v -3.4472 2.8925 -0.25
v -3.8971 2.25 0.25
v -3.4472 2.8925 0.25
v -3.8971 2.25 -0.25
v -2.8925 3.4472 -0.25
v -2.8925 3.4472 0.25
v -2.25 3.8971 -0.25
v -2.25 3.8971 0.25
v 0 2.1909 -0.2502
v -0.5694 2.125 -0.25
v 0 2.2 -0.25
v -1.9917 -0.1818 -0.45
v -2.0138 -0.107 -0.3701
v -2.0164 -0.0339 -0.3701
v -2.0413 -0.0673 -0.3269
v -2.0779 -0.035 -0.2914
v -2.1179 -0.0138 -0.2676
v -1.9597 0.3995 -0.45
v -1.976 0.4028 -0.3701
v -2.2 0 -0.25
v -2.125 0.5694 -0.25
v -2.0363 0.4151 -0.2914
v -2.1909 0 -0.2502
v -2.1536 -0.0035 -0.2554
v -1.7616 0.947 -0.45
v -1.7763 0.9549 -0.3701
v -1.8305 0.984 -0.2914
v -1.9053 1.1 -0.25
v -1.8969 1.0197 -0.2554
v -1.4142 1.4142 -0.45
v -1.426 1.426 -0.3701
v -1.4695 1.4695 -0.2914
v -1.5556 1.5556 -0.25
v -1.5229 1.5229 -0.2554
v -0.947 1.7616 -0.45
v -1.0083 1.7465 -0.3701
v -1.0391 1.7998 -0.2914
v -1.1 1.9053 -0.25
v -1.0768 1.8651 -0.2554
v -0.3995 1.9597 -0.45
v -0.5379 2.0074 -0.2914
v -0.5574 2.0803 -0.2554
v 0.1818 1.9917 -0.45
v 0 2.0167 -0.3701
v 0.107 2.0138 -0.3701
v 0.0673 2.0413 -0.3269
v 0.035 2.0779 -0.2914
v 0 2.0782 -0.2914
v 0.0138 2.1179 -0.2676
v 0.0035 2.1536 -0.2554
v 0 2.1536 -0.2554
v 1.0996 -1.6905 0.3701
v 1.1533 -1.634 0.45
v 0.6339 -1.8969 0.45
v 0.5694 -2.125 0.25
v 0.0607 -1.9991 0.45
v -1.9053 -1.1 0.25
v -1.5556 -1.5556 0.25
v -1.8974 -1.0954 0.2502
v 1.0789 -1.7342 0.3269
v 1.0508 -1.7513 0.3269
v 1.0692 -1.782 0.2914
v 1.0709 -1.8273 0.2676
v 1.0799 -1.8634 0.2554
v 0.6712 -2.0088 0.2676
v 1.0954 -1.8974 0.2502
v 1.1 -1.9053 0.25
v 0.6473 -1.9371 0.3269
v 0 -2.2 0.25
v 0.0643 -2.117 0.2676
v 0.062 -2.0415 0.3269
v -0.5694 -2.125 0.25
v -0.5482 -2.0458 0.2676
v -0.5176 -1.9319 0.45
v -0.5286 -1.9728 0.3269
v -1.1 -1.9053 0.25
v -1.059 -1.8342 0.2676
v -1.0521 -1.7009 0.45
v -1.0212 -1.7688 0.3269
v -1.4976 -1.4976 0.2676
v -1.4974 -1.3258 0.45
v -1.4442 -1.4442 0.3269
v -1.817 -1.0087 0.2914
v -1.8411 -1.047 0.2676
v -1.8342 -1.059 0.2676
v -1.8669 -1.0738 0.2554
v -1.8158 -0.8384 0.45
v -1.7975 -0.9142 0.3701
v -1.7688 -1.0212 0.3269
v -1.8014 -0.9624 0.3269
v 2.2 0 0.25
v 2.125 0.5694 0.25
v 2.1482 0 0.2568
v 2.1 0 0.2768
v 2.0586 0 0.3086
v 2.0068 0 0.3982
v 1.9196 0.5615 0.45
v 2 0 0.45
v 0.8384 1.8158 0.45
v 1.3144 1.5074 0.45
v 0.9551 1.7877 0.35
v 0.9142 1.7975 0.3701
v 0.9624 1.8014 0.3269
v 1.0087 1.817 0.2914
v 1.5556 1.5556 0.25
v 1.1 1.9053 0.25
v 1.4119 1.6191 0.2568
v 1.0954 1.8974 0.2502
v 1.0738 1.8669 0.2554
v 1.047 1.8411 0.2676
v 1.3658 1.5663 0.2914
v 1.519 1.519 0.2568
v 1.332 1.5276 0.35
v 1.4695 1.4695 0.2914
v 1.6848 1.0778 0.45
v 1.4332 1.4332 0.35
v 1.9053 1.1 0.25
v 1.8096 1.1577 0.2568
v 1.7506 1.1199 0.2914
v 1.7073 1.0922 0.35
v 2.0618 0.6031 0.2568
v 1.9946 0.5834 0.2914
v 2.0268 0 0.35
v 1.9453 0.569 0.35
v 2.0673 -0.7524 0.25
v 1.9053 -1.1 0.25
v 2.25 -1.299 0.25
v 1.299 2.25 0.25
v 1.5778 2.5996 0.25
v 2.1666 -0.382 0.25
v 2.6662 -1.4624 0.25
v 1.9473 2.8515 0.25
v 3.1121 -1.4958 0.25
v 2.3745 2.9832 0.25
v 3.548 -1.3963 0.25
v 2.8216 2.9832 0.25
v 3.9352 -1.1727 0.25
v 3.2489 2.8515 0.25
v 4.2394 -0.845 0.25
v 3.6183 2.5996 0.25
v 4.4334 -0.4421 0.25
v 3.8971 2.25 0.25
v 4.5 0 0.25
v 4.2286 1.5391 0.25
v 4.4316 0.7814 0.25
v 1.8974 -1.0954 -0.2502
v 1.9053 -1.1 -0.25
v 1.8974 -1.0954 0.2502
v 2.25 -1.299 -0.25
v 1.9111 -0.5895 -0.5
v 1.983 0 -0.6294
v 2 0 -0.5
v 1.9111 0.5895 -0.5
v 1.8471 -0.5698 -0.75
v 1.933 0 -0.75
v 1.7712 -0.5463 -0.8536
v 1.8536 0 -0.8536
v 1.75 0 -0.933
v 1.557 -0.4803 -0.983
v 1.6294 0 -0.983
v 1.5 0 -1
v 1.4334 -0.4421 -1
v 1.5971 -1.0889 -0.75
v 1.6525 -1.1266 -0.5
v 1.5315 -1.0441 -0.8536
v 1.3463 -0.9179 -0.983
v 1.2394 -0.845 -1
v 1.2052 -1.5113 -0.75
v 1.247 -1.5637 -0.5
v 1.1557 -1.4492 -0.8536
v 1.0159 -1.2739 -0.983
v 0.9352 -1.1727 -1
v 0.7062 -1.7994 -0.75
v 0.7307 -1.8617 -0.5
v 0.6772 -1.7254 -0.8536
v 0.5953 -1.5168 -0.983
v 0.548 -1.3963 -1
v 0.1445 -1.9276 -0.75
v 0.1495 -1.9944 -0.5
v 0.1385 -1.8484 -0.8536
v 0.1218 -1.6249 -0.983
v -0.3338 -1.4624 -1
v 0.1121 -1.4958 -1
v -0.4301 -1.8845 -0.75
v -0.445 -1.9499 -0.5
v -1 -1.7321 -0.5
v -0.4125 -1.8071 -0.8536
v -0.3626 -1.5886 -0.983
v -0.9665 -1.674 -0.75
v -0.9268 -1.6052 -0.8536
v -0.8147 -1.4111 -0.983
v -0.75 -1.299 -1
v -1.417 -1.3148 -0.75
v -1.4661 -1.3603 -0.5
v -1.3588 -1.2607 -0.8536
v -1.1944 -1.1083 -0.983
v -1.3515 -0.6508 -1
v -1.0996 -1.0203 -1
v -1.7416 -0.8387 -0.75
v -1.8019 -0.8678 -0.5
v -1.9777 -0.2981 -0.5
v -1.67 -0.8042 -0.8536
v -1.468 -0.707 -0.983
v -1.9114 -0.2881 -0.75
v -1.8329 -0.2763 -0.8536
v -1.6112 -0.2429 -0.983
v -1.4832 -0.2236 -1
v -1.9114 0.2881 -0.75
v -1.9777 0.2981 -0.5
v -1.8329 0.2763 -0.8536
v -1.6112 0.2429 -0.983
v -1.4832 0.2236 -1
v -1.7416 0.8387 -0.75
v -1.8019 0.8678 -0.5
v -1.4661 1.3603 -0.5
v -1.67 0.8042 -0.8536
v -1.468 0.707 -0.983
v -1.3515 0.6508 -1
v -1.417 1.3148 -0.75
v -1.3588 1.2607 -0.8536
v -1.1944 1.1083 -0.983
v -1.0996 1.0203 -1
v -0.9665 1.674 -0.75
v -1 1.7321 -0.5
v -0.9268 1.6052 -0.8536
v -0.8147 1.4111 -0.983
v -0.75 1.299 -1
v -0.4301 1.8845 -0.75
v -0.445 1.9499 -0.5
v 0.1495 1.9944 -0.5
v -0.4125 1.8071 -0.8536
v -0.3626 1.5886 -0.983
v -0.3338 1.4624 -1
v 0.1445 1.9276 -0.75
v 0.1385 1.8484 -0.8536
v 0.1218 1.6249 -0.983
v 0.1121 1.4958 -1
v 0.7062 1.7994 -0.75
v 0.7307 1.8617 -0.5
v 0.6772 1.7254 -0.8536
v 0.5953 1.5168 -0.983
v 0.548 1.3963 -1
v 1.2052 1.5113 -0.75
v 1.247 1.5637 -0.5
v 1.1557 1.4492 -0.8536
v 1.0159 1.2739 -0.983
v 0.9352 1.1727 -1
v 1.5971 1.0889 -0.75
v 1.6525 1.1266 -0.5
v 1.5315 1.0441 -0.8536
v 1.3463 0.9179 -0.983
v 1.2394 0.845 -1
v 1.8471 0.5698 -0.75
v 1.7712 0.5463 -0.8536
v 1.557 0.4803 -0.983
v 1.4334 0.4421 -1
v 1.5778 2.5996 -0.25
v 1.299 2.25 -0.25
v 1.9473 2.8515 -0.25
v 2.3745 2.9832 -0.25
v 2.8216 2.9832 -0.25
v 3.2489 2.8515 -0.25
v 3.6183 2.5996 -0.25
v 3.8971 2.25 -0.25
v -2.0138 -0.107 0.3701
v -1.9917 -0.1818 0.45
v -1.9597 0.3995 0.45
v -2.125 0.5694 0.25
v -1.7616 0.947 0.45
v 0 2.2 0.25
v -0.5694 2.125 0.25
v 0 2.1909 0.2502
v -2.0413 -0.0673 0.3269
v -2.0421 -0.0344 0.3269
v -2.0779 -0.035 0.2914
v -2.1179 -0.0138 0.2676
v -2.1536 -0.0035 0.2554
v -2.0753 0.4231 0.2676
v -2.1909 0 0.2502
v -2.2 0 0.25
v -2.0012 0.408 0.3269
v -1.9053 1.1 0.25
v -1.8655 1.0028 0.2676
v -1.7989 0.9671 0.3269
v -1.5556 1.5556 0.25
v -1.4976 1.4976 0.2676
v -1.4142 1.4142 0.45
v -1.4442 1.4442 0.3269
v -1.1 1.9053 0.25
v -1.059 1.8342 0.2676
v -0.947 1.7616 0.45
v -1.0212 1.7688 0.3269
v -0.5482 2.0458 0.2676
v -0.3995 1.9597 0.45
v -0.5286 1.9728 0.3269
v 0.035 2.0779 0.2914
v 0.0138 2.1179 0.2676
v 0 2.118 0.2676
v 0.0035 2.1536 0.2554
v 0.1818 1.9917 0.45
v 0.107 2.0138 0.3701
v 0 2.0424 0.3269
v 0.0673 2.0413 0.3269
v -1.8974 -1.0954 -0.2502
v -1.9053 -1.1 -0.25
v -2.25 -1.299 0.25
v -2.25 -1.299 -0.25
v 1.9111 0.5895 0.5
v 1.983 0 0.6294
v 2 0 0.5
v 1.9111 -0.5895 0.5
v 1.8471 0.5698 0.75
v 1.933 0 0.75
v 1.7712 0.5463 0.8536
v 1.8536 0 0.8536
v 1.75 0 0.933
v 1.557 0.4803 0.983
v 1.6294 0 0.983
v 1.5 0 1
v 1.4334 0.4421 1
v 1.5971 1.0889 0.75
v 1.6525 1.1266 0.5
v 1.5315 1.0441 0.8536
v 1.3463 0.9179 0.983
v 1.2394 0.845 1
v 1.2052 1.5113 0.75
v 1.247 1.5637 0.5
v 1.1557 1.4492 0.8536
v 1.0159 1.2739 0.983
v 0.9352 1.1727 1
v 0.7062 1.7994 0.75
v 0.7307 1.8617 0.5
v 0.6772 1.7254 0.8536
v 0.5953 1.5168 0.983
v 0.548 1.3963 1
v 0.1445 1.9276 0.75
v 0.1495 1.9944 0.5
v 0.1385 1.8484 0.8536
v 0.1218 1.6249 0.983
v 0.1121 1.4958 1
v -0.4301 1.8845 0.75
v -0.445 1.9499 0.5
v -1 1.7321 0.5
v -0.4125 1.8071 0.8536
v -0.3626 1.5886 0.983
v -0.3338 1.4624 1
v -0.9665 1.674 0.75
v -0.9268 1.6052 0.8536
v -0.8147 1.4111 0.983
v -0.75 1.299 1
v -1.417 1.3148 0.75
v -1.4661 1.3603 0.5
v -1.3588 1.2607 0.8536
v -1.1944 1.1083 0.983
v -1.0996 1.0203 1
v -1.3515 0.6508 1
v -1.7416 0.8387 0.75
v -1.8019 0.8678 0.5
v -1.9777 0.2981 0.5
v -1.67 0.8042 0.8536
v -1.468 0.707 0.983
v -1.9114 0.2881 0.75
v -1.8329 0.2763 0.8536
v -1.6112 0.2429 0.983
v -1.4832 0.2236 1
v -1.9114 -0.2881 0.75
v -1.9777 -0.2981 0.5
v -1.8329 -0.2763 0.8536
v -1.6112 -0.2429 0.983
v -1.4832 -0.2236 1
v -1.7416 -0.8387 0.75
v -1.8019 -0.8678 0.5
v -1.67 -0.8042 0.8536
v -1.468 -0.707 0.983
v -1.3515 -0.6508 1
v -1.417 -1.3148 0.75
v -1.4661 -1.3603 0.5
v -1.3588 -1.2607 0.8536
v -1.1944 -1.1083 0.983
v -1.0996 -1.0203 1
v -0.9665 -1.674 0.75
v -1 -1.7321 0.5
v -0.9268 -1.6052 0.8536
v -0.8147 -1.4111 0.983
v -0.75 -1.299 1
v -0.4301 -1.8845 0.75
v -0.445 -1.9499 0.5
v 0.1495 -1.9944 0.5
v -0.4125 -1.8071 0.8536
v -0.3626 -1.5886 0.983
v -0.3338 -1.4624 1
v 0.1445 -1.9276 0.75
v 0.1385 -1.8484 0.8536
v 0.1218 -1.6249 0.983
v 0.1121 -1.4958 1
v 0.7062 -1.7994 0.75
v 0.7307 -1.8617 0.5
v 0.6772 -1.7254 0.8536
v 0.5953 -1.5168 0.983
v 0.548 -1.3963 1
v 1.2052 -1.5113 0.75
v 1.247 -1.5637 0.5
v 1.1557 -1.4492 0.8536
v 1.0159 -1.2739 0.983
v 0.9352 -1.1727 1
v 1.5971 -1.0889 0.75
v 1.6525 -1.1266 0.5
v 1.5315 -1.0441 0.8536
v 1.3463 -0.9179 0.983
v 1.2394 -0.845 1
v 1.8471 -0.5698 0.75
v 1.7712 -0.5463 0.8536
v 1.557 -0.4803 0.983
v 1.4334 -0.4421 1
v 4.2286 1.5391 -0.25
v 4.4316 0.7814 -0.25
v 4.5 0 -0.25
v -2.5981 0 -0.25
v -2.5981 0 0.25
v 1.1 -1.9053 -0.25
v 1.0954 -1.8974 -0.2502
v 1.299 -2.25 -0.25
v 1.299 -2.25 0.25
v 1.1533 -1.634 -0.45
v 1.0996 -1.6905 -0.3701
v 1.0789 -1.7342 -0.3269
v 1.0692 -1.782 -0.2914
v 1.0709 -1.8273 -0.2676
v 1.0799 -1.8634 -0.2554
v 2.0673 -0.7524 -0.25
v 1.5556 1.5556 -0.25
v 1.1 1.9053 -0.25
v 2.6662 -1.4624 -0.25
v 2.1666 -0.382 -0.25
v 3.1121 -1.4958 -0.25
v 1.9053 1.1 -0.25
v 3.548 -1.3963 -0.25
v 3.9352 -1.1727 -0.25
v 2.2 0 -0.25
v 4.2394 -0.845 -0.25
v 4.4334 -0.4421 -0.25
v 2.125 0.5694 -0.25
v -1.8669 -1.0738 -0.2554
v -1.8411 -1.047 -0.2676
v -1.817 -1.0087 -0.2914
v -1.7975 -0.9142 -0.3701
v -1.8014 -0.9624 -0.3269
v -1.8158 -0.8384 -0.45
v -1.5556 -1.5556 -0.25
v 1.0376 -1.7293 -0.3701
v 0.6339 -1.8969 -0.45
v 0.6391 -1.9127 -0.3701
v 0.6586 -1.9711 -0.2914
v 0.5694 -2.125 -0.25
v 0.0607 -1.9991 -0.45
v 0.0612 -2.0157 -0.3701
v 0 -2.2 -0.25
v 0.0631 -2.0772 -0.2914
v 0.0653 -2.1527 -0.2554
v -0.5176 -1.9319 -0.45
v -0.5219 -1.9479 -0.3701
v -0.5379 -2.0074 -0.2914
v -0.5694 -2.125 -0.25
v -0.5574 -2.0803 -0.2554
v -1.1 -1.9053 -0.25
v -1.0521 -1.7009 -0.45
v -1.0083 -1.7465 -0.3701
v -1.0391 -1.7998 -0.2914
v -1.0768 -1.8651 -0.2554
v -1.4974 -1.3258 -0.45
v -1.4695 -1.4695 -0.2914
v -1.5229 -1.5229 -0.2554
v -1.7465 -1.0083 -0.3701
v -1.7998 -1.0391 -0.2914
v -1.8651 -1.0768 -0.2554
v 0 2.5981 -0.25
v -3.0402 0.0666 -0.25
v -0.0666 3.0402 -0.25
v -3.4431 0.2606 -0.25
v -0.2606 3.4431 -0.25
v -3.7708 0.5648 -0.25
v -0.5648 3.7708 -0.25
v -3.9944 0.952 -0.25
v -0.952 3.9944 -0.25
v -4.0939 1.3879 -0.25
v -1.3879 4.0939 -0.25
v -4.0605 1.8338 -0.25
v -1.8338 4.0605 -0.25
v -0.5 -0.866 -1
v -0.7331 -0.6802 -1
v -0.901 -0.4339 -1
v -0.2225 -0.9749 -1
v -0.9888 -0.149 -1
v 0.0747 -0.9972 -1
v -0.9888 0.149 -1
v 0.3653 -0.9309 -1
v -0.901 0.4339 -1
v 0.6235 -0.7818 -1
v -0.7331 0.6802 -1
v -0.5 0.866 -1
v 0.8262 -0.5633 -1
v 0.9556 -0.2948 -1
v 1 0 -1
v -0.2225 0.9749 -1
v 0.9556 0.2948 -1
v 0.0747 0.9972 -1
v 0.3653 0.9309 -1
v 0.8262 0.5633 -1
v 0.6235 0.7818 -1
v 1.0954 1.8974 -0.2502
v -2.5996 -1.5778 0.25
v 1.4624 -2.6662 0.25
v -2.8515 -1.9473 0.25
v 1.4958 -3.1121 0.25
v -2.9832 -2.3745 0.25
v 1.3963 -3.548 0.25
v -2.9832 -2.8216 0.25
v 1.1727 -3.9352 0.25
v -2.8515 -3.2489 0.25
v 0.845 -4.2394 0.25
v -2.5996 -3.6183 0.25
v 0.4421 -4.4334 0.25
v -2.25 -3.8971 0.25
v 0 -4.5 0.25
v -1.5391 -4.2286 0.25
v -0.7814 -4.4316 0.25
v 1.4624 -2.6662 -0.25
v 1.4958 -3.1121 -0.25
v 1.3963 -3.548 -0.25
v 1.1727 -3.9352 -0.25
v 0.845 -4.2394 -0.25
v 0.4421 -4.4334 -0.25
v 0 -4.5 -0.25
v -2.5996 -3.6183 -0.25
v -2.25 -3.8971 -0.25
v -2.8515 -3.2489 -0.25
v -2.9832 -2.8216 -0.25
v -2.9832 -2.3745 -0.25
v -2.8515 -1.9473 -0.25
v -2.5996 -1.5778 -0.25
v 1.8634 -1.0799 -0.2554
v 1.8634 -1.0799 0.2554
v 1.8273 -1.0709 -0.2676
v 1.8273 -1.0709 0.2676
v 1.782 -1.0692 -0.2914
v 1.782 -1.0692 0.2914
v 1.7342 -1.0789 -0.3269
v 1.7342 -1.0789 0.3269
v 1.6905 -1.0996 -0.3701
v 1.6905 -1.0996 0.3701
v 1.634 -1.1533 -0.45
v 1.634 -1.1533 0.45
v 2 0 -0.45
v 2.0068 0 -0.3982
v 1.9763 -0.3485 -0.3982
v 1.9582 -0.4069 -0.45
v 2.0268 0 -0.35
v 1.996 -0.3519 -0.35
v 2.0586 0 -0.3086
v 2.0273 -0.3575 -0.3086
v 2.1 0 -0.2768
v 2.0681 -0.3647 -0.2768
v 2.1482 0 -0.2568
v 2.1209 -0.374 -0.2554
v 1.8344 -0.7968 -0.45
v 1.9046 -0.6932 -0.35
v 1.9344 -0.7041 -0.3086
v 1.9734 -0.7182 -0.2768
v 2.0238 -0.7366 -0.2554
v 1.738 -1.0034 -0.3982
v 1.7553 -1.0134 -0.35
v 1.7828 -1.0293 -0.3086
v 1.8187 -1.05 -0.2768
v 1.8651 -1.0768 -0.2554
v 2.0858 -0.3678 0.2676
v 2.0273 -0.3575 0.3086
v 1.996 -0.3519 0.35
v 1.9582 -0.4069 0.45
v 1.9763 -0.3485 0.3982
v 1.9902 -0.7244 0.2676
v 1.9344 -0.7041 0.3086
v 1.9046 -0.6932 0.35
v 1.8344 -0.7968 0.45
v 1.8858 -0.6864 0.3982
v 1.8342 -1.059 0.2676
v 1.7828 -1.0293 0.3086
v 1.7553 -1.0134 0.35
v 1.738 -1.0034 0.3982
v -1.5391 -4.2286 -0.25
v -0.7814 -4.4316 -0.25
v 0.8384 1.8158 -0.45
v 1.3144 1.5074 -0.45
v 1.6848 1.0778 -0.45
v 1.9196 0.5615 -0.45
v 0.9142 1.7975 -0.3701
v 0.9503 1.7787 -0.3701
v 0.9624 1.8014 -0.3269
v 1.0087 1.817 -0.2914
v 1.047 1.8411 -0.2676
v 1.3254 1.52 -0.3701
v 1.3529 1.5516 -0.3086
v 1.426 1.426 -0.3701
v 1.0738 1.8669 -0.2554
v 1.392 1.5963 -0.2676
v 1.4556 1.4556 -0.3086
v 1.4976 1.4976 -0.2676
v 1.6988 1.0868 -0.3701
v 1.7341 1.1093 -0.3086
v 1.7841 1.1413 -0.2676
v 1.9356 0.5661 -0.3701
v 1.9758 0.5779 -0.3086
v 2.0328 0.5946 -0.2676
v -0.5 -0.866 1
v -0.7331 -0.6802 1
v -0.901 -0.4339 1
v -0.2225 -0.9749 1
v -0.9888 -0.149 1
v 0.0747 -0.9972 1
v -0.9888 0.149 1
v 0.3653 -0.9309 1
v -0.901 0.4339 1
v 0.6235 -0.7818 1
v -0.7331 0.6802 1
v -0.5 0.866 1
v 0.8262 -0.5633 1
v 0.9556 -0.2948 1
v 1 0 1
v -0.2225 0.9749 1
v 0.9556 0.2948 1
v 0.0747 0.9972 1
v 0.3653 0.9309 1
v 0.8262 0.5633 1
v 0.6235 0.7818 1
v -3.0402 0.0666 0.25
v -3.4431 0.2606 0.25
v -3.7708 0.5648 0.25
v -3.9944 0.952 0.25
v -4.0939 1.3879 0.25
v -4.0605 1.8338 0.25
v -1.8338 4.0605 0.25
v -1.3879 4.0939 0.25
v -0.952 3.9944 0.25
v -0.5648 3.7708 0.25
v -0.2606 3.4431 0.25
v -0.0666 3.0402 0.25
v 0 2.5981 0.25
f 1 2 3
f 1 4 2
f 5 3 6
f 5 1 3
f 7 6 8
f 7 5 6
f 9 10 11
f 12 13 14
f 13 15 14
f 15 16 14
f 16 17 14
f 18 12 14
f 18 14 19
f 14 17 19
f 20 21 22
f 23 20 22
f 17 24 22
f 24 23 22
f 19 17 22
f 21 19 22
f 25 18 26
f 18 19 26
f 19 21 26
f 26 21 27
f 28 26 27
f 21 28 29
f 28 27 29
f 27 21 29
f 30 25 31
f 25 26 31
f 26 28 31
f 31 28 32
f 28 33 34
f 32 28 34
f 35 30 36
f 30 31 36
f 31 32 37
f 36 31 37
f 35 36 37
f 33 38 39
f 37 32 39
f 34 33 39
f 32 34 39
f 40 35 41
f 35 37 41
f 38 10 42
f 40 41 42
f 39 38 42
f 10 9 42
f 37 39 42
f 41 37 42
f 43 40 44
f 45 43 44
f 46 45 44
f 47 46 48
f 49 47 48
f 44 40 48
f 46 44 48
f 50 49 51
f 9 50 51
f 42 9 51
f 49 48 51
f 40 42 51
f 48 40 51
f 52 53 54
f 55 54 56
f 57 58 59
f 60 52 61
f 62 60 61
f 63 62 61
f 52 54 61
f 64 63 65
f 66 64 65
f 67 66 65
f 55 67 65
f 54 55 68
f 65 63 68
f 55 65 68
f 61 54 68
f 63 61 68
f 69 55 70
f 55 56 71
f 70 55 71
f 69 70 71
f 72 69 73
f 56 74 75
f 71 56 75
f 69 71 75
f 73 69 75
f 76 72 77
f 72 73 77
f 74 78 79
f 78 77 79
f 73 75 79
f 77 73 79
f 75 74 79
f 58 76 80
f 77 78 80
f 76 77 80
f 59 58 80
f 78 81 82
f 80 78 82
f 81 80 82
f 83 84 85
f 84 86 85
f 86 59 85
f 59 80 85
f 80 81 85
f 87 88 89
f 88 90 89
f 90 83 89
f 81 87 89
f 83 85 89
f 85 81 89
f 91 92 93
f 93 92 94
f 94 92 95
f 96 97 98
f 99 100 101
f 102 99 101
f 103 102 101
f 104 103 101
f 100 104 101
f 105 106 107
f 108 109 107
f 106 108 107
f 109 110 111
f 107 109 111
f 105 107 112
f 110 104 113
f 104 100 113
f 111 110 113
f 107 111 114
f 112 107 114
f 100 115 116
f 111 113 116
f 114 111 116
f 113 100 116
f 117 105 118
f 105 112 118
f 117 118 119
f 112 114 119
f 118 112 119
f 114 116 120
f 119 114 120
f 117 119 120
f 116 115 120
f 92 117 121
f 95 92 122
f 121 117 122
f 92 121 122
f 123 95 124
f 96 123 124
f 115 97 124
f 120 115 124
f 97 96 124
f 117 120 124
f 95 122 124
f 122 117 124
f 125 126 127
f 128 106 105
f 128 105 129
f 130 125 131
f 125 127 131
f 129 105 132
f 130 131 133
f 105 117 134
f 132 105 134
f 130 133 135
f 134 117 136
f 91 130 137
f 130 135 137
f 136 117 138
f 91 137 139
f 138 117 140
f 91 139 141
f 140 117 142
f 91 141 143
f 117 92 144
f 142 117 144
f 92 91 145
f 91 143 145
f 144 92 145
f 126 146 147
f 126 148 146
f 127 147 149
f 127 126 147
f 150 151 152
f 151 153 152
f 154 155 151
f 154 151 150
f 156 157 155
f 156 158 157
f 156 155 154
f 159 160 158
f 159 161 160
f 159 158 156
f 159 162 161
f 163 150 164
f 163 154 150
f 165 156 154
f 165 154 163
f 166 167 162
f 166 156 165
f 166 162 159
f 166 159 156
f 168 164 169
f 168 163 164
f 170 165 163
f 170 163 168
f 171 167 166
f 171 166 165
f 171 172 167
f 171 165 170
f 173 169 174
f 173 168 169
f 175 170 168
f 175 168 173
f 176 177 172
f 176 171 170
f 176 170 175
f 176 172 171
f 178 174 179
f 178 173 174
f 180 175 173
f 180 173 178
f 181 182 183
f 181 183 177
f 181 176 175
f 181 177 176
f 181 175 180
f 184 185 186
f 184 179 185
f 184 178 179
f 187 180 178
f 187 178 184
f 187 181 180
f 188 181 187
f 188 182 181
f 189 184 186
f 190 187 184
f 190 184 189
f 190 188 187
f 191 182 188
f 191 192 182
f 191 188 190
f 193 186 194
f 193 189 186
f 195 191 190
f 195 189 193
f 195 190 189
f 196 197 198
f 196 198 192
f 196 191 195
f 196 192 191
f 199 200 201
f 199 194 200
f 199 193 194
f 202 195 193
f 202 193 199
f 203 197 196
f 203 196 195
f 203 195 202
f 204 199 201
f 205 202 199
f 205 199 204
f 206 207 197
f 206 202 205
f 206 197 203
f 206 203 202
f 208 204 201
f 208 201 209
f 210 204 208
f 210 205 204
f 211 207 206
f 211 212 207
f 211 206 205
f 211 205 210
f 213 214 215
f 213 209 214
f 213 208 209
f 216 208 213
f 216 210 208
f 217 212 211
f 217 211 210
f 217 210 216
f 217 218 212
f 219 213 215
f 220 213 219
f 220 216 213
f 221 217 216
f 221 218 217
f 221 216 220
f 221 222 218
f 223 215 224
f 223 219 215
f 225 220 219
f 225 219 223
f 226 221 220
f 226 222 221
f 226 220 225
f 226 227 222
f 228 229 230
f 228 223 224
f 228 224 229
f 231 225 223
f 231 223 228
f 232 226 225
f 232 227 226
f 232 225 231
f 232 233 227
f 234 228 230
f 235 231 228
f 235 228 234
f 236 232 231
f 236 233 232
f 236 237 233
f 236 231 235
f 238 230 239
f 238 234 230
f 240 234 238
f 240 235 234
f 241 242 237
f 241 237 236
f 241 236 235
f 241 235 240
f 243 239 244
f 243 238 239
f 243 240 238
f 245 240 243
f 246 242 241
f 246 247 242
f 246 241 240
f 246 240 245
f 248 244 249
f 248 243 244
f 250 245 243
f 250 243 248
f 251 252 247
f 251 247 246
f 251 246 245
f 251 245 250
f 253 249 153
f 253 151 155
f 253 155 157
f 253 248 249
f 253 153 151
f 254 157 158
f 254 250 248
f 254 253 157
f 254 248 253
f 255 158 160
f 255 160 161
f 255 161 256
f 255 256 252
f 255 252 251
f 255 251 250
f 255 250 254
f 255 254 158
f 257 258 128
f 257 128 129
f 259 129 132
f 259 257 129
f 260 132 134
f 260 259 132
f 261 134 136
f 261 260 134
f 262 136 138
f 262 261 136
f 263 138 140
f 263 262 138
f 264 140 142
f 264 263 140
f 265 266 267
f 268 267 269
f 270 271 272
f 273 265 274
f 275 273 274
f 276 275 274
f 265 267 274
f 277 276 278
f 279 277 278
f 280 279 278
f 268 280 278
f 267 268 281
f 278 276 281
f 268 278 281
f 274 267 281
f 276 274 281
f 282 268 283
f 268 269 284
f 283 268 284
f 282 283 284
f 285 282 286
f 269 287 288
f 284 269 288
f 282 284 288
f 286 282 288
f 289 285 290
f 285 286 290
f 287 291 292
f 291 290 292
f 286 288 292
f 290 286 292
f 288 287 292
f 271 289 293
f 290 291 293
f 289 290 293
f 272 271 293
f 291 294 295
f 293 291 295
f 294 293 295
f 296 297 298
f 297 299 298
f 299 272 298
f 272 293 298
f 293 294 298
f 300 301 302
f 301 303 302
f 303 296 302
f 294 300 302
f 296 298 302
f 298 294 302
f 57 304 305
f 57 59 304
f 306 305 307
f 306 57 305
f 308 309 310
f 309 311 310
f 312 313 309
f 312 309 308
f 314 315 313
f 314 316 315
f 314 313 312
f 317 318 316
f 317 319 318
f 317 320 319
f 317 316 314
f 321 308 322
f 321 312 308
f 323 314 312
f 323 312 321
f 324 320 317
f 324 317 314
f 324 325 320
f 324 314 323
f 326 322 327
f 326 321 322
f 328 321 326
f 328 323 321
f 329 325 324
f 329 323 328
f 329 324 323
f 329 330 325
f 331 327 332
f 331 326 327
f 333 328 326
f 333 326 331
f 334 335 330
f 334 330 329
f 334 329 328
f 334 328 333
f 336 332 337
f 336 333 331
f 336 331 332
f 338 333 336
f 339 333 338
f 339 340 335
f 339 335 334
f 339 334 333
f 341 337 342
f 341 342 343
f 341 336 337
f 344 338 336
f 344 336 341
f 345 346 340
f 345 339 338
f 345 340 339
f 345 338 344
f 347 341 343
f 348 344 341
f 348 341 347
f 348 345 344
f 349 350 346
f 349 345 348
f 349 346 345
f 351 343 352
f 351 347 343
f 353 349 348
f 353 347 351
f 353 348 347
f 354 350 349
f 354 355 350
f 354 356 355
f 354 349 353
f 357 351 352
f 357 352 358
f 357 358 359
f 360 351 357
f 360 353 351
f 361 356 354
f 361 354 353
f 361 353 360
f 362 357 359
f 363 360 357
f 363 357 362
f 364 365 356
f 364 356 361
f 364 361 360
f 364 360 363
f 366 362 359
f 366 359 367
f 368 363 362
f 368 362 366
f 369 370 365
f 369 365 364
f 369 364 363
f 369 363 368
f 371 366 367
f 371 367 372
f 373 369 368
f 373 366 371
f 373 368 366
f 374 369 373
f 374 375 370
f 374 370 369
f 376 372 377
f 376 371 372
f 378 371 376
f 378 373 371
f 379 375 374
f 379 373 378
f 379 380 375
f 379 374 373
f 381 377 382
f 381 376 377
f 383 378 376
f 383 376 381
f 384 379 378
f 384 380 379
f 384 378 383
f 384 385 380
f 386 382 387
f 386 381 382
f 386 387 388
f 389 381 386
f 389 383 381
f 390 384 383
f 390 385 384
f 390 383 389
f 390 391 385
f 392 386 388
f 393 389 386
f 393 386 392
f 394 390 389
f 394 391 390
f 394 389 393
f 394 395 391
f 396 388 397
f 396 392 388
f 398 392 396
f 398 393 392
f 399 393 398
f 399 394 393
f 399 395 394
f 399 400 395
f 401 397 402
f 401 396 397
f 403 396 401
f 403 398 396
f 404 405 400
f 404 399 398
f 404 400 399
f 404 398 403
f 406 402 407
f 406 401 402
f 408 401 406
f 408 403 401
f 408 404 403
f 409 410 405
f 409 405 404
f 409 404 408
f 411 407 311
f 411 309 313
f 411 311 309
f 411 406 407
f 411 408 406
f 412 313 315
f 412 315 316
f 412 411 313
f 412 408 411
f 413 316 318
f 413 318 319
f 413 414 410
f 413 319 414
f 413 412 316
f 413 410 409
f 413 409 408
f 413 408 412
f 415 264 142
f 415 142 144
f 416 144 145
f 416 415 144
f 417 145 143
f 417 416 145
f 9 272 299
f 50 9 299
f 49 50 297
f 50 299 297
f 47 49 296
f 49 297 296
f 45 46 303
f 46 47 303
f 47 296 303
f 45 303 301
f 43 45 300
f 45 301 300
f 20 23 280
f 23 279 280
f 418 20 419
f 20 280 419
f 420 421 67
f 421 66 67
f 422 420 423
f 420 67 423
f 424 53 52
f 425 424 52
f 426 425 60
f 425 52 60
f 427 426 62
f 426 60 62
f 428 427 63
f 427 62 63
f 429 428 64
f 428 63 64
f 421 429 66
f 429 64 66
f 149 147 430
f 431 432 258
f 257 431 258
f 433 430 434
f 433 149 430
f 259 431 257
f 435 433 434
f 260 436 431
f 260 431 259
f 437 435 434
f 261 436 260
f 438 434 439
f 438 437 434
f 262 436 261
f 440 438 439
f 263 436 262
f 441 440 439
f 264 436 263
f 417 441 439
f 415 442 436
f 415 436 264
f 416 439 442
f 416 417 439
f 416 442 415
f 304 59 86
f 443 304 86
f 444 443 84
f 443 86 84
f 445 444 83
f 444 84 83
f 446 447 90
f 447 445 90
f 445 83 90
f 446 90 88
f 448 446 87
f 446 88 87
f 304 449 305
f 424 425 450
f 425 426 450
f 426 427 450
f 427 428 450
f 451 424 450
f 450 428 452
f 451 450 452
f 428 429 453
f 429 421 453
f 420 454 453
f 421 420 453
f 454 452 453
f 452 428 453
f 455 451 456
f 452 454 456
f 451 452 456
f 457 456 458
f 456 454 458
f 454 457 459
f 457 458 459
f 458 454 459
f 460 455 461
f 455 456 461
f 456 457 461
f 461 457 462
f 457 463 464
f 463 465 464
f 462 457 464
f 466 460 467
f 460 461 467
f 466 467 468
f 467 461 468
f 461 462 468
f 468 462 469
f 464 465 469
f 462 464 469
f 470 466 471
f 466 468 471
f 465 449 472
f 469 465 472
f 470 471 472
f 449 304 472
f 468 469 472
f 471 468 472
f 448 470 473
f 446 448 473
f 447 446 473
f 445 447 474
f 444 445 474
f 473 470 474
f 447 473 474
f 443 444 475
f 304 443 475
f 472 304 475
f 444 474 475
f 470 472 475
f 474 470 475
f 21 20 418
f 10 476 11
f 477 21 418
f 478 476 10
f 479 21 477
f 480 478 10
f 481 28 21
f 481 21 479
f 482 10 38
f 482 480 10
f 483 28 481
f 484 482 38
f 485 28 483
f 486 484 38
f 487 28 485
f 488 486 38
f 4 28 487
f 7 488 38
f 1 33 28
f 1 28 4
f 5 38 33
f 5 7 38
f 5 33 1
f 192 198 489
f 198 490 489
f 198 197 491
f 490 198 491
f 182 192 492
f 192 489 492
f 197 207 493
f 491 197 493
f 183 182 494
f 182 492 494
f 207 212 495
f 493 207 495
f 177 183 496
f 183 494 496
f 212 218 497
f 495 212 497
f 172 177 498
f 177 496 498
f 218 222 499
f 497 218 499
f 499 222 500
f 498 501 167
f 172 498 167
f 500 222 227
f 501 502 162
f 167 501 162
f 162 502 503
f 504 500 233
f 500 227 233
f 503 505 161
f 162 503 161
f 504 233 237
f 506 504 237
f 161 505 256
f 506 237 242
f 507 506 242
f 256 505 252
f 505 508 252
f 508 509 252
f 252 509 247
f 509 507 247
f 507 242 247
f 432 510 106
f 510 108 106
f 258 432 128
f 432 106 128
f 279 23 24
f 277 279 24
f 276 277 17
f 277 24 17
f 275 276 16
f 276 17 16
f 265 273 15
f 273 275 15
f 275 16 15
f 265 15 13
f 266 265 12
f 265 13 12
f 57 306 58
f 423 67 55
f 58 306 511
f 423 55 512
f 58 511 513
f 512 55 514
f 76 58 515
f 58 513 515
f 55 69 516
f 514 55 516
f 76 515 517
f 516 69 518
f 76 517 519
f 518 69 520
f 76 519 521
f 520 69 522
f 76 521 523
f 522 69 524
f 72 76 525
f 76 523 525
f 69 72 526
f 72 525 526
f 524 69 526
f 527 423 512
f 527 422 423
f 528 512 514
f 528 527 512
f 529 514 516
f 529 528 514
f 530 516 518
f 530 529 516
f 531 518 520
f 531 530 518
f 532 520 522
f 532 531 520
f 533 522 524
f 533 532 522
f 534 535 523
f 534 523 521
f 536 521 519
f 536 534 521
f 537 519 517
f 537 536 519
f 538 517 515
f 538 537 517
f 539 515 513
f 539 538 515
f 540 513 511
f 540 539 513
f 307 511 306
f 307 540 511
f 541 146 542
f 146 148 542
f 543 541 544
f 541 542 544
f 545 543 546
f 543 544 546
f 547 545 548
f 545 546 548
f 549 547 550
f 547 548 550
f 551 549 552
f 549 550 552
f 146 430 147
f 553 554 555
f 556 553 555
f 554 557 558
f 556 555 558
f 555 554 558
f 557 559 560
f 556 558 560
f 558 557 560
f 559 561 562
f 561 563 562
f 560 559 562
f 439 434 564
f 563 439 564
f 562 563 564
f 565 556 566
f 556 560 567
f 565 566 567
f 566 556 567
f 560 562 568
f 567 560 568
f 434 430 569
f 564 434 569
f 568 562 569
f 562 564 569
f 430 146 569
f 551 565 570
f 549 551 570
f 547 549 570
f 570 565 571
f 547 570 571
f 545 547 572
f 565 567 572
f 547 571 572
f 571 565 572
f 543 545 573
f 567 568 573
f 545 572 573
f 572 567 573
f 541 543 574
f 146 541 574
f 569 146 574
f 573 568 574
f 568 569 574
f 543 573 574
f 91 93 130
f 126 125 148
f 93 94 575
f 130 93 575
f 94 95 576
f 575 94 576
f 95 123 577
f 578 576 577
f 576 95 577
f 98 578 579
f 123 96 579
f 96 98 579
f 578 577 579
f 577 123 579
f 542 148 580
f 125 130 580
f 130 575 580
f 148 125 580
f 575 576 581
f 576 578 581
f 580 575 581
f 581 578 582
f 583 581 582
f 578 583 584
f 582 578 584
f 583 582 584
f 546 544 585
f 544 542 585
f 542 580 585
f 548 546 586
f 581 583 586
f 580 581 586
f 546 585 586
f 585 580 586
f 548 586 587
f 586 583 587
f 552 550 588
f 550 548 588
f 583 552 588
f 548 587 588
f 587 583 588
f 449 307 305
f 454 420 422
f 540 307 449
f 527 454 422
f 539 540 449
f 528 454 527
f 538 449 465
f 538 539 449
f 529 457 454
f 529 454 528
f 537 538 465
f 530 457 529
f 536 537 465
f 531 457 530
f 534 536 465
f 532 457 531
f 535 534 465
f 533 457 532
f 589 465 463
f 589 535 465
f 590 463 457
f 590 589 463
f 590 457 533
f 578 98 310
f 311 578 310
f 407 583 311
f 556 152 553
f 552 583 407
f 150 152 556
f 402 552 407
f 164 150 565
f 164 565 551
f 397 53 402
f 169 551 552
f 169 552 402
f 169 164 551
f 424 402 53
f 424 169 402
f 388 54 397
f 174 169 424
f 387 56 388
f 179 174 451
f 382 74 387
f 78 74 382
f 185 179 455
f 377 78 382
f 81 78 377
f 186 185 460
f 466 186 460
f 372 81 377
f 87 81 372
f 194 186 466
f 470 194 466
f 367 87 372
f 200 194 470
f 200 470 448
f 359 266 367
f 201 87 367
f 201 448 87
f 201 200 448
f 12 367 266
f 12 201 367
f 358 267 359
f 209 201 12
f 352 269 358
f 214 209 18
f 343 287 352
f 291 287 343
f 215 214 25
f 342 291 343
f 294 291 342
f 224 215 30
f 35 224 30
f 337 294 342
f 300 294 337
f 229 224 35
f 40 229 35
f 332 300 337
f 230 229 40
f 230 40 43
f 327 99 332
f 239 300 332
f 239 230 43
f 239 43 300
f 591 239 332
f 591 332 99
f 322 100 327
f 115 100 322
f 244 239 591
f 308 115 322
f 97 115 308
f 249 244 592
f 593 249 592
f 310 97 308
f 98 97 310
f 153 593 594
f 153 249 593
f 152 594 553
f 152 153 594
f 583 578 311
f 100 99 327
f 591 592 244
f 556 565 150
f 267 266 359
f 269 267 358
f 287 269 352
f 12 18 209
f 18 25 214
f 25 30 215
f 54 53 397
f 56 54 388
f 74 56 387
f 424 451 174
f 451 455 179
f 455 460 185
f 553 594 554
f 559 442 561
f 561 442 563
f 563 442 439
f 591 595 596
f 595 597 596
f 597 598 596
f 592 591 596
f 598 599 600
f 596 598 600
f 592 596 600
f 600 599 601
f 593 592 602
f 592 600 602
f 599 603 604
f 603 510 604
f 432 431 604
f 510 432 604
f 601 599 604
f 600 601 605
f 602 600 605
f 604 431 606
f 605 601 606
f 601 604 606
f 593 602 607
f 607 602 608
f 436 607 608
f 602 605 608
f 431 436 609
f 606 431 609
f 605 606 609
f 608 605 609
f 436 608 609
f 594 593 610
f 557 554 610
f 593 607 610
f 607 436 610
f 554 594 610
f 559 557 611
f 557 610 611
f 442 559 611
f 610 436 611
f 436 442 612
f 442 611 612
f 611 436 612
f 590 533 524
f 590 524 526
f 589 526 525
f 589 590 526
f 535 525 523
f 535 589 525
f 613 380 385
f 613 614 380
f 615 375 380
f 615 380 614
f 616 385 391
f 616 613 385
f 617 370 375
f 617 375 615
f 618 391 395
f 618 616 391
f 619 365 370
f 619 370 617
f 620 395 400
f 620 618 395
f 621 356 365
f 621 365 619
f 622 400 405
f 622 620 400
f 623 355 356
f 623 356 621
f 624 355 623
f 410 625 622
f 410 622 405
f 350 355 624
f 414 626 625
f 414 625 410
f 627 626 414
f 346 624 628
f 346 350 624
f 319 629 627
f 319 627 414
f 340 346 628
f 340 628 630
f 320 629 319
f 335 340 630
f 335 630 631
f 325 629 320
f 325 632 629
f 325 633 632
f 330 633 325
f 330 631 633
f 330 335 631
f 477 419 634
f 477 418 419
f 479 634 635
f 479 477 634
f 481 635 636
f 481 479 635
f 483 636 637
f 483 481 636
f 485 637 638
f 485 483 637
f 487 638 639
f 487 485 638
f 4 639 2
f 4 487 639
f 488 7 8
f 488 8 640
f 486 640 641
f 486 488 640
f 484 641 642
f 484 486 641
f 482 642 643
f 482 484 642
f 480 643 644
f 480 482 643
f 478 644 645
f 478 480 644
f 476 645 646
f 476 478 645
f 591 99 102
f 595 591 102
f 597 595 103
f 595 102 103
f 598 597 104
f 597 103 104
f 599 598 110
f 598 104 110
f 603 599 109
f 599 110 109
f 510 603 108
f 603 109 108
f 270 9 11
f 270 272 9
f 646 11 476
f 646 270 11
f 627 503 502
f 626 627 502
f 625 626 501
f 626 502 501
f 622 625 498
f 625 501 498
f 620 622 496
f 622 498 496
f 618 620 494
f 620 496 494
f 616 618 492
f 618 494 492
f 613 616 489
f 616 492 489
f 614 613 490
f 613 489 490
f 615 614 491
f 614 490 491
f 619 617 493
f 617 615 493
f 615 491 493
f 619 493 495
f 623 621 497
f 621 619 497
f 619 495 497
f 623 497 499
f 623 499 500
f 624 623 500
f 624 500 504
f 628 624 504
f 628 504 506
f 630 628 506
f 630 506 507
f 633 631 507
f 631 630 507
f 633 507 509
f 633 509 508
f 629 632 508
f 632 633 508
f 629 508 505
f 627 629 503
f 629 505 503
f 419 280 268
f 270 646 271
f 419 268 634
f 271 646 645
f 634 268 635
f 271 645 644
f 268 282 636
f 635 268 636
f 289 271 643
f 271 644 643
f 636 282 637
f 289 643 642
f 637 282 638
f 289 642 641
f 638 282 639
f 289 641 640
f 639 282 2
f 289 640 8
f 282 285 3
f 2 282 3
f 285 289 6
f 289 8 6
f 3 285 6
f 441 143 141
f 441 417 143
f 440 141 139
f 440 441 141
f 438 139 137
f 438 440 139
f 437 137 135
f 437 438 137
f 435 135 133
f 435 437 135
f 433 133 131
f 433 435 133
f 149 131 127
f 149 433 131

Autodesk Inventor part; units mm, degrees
ref_plane "YZ Plane" through (0, 0, 0) normal (1, 0, 0) x (0, 1, 0)
ref_plane "XZ Plane" through (0, 0, 0) normal (0, 1, 0) x (-1, 0, 0)
ref_plane "XY Plane" through (0, 0, 0) normal (0, 0, 1) x (1, 0, 0)
sketch "Sketch1" plane through (0, 0, 0) normal (0, 0, 1) x (1, 0, 0)
  circle A0 centre (0, 0) radius 2
  circle A1 centre (0, 0) radius 1
  dimension "d0" = 4
  dimension "d1" = 2
extrude "Extrusion1" add sketch "Sketch1" along normal mid plane 2
sketch "Sketch2" plane through (0, 0, 0) normal (0, 0, 1) x (1, 0, 0)
  point P0 (0, 0)
sketch "Sketch3" plane through (0, 0, 0) normal (0, 1, 0) x (-1, 0, 0)
  line L0 (2, 0.25) -> (4.5, 0.25)
  line L1 (4.5, 0.25) -> (4.5, -0.25)
  line L2 (4.5, -0.25) -> (2, -0.25)
  line L3 (2, -0.25) -> (2, 0.25)
  line L4 (2, 1) -> (-2, 1) projected
  line L5 (0, 0) -> (0, -2.5781)
  dimension "d4" = 0.5
  dimension "d5" = 2.5
  dimension "d6" = 0.75
  dimension "d15" = 4
revolve "Revolution1" add sketch "Sketch3" angle 90 about axis through (0, 0, 0) along (0, 0, -1)
fillet "Fillet1" radius 1.5 2 edges at (0, 4.5, 0) (-4.5, 0, 0)
fillet "Fillet2" radius 0.2 4 edges at (-2, 0, 0) (-1.4142, 1.4142, -0.25) (-1.4142, 1.4142, 0.25) (0, 2, 0)
pattern_circular "Circular Pattern1" count 3 over 360 about axis through (0, 0, 0) along (0, 0, 1) of "Revolution1", "Fillet1", "Fillet2"
fillet "Fillet3" radius 0.5 1 edges at (-2, 0, 1)
fillet "Fillet3" radius 0.5 1 edges at (-2, 0, -1)
equation "\"d1\" = 0.5 * d0"
properties part number "fan" material "PPS Plastic"
